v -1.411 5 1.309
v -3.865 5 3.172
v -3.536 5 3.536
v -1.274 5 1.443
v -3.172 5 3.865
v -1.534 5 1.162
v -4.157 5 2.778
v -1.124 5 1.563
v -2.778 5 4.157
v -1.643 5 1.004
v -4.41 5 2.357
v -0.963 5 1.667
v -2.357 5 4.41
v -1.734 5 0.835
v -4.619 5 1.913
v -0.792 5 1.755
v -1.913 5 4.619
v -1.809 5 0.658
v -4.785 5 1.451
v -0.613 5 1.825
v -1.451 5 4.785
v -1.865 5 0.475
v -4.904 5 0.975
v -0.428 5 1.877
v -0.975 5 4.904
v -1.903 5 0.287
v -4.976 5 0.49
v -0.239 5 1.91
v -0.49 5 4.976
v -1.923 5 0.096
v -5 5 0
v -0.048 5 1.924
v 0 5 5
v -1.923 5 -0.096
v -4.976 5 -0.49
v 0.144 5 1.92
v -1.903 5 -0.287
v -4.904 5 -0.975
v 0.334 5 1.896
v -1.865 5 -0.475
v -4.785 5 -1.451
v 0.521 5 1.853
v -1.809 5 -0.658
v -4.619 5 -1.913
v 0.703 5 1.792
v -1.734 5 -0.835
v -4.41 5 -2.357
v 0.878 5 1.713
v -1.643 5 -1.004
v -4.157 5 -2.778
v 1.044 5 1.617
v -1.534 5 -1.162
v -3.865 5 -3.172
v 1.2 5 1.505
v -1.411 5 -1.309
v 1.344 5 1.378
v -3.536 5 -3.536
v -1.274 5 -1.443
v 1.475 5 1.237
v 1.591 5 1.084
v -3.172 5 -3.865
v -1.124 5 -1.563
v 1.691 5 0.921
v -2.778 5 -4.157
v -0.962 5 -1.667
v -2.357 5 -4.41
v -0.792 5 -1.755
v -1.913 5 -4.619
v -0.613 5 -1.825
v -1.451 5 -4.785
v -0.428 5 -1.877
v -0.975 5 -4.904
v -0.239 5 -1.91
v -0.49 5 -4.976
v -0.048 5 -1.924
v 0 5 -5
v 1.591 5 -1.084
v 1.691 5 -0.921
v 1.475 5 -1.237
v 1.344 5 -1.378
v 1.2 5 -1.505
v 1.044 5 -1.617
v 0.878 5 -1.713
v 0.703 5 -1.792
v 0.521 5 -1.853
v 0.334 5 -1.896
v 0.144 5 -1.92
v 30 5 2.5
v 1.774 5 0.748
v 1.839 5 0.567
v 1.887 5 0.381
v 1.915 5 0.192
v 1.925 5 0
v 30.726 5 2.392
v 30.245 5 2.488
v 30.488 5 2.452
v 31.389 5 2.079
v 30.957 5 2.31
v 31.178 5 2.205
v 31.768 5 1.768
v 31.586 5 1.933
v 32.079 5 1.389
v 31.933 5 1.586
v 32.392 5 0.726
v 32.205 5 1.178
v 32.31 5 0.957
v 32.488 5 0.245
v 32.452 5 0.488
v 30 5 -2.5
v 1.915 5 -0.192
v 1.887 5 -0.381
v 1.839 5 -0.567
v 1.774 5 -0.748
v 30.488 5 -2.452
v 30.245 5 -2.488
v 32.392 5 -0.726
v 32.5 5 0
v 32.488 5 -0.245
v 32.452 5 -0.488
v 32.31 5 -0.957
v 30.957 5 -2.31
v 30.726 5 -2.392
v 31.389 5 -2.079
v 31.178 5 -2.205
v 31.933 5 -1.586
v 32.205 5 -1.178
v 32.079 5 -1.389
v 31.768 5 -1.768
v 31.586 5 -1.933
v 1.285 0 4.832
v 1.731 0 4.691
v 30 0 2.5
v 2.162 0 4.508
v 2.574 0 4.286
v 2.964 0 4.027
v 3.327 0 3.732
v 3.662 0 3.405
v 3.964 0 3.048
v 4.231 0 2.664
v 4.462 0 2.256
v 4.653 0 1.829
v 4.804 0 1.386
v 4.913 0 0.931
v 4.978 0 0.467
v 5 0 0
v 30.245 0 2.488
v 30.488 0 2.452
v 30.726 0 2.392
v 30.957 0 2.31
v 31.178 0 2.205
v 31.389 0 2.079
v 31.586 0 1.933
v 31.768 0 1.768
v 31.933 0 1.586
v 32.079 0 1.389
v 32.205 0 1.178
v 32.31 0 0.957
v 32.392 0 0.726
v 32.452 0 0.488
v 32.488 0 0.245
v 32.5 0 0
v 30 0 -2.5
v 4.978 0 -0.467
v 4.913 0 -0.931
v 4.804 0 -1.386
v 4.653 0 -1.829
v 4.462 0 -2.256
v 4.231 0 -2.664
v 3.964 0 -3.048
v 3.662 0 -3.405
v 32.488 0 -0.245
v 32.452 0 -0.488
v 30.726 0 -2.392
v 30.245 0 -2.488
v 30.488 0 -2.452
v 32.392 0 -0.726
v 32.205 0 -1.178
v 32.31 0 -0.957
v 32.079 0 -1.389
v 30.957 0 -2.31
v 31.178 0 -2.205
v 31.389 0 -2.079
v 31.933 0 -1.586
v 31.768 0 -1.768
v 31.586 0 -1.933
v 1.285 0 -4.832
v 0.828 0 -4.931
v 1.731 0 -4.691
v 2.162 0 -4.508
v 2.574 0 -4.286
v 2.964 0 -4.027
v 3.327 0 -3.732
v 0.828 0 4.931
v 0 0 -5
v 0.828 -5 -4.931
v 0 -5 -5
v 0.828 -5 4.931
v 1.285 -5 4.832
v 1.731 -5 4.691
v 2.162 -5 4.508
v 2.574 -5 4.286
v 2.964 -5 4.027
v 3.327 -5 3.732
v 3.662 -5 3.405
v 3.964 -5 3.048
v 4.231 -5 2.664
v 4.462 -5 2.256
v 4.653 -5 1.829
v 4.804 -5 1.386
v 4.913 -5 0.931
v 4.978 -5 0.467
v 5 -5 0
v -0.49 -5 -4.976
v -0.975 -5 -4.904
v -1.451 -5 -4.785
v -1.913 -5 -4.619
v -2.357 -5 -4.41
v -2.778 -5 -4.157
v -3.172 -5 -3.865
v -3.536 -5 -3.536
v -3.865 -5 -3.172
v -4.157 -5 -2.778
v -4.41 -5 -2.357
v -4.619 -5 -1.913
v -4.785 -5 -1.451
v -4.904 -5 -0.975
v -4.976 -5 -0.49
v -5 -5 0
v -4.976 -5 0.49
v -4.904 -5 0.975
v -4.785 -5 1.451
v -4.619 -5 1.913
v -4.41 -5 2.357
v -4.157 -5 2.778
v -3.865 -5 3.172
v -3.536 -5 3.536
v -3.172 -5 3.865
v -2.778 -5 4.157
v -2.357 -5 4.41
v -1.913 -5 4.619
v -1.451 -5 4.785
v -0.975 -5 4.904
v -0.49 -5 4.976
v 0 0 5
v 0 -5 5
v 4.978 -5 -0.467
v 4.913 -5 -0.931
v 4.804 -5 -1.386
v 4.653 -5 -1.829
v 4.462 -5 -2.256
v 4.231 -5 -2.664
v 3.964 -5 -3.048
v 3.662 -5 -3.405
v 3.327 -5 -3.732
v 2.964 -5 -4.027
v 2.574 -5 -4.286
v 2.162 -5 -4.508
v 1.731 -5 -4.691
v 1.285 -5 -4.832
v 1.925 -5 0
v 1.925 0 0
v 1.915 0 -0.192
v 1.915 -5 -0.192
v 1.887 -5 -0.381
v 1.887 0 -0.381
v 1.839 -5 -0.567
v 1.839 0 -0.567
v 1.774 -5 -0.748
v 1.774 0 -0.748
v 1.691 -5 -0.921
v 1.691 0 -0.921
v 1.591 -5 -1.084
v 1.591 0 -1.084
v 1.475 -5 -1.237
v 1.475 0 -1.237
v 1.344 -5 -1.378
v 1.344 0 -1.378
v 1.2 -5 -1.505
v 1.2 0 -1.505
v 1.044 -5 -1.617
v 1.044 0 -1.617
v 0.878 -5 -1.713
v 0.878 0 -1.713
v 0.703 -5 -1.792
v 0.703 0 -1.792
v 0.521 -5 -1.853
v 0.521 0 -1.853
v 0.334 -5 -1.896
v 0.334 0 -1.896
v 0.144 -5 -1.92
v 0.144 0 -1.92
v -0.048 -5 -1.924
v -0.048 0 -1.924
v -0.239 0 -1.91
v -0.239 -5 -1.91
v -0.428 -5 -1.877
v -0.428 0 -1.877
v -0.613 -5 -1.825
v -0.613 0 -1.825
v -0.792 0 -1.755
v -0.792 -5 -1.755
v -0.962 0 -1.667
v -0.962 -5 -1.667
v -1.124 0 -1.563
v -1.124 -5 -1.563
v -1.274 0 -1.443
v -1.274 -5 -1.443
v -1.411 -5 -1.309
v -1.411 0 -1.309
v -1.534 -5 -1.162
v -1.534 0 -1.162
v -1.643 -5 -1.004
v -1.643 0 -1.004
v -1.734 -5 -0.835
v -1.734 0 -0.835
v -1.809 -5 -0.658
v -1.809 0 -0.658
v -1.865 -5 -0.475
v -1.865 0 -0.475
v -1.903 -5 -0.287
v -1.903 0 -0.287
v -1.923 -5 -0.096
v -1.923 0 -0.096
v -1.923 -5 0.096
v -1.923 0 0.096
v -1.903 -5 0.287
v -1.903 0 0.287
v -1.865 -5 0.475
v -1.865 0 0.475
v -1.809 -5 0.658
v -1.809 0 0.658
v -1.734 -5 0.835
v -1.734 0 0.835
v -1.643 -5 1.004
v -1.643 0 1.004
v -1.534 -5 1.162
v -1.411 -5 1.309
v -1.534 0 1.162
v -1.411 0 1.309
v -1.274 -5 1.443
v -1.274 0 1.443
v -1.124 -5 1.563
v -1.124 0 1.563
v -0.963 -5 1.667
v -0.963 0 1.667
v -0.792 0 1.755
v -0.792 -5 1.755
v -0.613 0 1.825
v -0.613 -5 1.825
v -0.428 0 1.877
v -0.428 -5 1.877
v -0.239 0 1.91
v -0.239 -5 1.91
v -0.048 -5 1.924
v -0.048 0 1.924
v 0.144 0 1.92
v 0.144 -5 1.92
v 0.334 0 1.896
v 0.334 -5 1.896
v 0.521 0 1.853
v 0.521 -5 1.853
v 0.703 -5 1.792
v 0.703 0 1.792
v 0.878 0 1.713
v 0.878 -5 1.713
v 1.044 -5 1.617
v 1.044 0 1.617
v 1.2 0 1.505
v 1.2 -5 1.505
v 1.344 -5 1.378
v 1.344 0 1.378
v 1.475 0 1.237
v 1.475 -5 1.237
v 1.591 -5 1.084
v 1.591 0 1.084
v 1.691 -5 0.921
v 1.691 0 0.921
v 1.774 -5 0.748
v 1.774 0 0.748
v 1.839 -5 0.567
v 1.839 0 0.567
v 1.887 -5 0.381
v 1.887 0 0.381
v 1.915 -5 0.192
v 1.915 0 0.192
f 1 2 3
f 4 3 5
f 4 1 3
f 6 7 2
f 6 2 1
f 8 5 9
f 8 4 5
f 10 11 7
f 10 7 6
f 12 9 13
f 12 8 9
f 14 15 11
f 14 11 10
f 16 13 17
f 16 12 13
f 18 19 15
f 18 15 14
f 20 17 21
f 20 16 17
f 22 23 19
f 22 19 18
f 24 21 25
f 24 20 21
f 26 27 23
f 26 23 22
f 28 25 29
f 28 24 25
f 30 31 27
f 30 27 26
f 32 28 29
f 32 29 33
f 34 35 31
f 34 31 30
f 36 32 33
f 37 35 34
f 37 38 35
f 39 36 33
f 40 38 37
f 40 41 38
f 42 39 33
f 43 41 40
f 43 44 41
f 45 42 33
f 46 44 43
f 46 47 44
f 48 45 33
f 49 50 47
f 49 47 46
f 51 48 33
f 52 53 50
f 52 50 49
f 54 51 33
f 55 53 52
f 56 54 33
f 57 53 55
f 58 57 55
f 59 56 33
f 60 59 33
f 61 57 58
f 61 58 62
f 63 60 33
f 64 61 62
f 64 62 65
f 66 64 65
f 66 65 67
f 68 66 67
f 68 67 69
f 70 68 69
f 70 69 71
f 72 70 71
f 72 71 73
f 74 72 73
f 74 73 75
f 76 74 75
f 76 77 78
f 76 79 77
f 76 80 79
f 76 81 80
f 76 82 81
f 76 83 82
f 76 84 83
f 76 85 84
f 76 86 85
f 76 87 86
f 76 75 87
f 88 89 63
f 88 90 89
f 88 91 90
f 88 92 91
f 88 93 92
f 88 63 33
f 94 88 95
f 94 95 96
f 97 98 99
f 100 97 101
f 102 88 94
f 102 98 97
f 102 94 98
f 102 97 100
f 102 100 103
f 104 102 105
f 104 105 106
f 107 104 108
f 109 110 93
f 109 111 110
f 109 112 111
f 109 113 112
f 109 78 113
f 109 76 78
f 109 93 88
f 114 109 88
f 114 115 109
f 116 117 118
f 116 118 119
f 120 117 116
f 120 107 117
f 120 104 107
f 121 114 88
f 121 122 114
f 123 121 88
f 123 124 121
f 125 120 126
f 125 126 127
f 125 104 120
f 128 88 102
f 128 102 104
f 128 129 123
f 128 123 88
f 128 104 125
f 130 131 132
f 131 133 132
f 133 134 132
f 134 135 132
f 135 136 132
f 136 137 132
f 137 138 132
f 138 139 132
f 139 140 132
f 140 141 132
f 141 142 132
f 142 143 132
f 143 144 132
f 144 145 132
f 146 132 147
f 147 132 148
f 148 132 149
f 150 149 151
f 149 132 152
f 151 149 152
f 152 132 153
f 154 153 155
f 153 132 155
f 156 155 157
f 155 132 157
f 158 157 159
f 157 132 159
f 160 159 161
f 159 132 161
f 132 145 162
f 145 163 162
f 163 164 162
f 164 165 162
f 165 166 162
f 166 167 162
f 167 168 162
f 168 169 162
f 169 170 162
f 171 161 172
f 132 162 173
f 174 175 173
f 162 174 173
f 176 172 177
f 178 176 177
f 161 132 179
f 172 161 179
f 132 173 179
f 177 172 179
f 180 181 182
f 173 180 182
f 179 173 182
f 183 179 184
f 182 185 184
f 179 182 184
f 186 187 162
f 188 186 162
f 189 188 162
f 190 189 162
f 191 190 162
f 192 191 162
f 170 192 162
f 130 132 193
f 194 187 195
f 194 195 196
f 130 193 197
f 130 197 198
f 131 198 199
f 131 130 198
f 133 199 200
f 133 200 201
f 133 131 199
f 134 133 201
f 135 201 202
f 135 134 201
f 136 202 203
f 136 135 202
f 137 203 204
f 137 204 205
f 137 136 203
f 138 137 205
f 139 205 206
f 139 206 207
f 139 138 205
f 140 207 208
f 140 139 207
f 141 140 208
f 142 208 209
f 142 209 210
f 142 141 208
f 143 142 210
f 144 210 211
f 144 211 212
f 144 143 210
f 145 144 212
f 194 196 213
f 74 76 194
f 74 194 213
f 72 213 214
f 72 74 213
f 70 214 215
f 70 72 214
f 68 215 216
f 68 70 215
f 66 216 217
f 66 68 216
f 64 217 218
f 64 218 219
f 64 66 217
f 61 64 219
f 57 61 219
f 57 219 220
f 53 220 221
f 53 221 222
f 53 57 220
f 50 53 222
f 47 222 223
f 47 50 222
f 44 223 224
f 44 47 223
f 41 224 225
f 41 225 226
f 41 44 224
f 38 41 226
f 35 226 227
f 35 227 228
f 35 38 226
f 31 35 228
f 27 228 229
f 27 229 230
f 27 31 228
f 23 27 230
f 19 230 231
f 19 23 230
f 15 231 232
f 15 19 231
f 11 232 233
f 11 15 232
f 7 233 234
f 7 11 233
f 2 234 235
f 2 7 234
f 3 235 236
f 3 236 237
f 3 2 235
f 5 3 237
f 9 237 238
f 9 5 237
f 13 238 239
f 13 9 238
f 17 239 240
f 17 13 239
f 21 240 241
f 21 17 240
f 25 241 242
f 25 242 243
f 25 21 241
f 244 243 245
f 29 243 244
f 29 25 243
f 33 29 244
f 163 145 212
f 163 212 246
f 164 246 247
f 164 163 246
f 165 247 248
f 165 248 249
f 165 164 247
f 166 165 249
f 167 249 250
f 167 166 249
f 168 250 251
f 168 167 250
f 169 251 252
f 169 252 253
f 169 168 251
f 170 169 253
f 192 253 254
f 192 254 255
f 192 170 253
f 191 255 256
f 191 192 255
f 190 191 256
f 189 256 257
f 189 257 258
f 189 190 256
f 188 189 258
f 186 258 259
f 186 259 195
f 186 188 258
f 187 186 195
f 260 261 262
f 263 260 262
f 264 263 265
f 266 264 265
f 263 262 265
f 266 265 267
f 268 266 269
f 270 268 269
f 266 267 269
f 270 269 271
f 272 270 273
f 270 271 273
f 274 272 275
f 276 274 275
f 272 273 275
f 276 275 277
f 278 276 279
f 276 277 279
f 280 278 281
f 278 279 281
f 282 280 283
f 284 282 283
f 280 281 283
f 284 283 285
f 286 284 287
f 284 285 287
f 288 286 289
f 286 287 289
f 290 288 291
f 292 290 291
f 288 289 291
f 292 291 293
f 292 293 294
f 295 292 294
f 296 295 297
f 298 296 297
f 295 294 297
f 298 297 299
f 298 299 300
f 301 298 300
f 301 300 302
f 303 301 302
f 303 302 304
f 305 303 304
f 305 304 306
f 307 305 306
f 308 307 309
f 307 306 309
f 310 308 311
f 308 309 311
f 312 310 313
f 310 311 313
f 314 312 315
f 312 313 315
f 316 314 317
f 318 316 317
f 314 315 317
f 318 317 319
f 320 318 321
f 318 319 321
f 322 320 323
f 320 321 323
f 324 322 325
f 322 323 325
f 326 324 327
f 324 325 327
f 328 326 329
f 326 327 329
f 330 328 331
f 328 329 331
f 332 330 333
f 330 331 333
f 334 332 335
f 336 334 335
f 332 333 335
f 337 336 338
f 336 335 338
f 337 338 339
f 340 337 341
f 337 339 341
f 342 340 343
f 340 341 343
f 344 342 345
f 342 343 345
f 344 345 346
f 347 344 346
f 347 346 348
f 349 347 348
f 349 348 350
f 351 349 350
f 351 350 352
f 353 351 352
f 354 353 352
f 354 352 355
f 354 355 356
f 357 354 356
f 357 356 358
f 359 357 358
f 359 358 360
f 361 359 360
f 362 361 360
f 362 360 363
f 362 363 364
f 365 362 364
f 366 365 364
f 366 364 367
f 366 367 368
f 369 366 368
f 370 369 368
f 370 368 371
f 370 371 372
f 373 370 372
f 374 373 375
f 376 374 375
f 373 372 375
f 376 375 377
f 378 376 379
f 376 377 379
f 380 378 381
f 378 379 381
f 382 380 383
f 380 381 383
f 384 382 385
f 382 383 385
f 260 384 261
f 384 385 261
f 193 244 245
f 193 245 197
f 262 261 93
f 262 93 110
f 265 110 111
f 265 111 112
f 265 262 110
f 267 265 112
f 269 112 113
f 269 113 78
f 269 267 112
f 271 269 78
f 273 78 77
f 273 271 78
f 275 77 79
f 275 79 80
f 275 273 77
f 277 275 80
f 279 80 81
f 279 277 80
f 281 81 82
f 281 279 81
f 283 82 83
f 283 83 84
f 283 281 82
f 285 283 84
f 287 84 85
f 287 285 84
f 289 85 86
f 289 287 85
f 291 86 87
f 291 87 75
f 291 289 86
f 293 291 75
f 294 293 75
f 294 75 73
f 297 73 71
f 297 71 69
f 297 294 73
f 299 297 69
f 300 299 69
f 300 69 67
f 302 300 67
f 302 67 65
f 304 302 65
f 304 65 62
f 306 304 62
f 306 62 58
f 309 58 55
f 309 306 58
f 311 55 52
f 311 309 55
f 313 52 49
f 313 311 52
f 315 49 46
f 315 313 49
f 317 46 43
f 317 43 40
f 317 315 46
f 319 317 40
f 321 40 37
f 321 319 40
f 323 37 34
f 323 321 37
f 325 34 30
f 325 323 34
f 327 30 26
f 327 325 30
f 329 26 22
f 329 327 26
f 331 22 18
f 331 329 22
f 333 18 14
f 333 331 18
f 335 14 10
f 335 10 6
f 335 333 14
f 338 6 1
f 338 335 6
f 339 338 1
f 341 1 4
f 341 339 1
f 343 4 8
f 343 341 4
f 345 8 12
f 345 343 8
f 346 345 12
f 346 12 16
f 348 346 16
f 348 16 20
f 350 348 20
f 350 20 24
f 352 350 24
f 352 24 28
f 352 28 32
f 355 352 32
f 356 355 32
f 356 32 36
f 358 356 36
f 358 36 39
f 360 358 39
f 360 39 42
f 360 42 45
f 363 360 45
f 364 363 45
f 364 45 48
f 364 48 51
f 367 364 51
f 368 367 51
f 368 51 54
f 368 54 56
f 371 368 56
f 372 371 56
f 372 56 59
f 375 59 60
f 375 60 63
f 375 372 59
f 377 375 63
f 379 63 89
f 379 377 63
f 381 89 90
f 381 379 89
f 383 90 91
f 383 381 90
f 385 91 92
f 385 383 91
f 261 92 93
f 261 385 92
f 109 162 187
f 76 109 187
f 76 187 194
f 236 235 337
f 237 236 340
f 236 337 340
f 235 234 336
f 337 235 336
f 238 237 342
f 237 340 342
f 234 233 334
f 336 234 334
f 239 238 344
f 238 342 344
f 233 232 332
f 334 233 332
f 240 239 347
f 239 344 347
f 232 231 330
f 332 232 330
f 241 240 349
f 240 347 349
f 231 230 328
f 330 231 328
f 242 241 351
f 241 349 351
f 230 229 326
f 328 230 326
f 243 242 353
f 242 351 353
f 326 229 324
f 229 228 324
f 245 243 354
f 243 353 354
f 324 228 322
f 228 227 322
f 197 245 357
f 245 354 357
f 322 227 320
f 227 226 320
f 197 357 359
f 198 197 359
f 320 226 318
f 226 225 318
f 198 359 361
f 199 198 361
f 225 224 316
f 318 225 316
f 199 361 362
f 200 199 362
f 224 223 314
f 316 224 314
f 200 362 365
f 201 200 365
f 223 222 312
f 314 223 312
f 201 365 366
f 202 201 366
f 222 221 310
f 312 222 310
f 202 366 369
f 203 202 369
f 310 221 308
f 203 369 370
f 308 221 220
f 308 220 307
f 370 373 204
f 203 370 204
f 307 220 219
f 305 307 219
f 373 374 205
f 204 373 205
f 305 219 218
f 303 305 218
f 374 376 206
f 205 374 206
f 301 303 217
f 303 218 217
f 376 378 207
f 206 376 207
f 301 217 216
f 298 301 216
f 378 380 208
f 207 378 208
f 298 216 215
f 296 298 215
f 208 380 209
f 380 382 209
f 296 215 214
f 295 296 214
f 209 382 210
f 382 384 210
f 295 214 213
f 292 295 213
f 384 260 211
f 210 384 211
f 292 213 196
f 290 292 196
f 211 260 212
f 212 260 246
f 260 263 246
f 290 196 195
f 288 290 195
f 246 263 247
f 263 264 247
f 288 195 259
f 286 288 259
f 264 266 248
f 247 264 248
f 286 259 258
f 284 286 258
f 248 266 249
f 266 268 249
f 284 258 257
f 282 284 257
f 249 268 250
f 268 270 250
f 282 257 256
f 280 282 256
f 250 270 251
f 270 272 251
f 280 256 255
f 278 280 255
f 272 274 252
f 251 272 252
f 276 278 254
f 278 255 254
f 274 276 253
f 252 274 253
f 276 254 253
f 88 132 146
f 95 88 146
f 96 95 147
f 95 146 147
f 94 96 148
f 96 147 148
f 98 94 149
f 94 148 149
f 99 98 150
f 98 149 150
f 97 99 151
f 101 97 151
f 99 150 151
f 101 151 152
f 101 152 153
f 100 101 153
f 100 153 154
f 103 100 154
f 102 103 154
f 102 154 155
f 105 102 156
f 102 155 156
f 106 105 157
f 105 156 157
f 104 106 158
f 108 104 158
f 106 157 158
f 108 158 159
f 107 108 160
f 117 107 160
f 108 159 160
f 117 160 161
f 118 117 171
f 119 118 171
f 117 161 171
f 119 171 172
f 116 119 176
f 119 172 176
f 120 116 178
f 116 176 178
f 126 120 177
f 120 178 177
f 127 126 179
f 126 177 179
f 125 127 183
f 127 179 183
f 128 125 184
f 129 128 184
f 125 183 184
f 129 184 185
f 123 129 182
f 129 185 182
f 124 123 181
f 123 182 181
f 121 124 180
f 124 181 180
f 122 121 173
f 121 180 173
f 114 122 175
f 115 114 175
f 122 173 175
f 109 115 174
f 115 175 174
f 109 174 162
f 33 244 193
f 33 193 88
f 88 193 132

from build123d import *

# Parameters (mm, degrees)
SKETCH2_R           = 1.925
BOSS_EXTRUDE1_DEPTH = 5
BOSS_EXTRUDE2_START = -5
SKETCH2_3_R         = 1.925
BOSS_EXTRUDE2_DEPTH = 5


with BuildPart() as part:
    # Sketch2 → Boss-Extrude1 (new body)
    with BuildSketch(Plane(origin=(0, 0, 0), x_dir=(1, 0, 0), z_dir=(0, 1, 0))):
        with BuildLine():
            ThreePointArc((0, 5), (-5, 0), (0, -5))
            Line((0, -5), (30, -2.5))
            ThreePointArc((30, -2.5), (32.5, 0), (30, 2.5))
            Line((30, 2.5), (0, 5))
        make_face()
        Circle(SKETCH2_R, mode=Mode.SUBTRACT)
    extrude(amount=BOSS_EXTRUDE1_DEPTH)

    # Sketch2<3> → Boss-Extrude2 (add)
    with BuildSketch(Plane(origin=(0, 0, 0), x_dir=(1, 0, 0), z_dir=(0, 1, 0)).offset(BOSS_EXTRUDE2_START)):
        with BuildLine():
            Line((0.827586207, 4.931034483), (0, 5))
            ThreePointArc((0, 5), (-5, 0), (0, -5))
            Line((0, -5), (0.827586207, -4.931034483))
            ThreePointArc((0.827586207, -4.931034483), (3.816931427, -3.229711207), (5, 0))
            ThreePointArc((5, 0), (3.816931427, 3.229711207), (0.827586207, 4.931034483))
        make_face()
        Circle(SKETCH2_3_R, mode=Mode.SUBTRACT)
    extrude(amount=BOSS_EXTRUDE2_DEPTH)


solid = part.part
